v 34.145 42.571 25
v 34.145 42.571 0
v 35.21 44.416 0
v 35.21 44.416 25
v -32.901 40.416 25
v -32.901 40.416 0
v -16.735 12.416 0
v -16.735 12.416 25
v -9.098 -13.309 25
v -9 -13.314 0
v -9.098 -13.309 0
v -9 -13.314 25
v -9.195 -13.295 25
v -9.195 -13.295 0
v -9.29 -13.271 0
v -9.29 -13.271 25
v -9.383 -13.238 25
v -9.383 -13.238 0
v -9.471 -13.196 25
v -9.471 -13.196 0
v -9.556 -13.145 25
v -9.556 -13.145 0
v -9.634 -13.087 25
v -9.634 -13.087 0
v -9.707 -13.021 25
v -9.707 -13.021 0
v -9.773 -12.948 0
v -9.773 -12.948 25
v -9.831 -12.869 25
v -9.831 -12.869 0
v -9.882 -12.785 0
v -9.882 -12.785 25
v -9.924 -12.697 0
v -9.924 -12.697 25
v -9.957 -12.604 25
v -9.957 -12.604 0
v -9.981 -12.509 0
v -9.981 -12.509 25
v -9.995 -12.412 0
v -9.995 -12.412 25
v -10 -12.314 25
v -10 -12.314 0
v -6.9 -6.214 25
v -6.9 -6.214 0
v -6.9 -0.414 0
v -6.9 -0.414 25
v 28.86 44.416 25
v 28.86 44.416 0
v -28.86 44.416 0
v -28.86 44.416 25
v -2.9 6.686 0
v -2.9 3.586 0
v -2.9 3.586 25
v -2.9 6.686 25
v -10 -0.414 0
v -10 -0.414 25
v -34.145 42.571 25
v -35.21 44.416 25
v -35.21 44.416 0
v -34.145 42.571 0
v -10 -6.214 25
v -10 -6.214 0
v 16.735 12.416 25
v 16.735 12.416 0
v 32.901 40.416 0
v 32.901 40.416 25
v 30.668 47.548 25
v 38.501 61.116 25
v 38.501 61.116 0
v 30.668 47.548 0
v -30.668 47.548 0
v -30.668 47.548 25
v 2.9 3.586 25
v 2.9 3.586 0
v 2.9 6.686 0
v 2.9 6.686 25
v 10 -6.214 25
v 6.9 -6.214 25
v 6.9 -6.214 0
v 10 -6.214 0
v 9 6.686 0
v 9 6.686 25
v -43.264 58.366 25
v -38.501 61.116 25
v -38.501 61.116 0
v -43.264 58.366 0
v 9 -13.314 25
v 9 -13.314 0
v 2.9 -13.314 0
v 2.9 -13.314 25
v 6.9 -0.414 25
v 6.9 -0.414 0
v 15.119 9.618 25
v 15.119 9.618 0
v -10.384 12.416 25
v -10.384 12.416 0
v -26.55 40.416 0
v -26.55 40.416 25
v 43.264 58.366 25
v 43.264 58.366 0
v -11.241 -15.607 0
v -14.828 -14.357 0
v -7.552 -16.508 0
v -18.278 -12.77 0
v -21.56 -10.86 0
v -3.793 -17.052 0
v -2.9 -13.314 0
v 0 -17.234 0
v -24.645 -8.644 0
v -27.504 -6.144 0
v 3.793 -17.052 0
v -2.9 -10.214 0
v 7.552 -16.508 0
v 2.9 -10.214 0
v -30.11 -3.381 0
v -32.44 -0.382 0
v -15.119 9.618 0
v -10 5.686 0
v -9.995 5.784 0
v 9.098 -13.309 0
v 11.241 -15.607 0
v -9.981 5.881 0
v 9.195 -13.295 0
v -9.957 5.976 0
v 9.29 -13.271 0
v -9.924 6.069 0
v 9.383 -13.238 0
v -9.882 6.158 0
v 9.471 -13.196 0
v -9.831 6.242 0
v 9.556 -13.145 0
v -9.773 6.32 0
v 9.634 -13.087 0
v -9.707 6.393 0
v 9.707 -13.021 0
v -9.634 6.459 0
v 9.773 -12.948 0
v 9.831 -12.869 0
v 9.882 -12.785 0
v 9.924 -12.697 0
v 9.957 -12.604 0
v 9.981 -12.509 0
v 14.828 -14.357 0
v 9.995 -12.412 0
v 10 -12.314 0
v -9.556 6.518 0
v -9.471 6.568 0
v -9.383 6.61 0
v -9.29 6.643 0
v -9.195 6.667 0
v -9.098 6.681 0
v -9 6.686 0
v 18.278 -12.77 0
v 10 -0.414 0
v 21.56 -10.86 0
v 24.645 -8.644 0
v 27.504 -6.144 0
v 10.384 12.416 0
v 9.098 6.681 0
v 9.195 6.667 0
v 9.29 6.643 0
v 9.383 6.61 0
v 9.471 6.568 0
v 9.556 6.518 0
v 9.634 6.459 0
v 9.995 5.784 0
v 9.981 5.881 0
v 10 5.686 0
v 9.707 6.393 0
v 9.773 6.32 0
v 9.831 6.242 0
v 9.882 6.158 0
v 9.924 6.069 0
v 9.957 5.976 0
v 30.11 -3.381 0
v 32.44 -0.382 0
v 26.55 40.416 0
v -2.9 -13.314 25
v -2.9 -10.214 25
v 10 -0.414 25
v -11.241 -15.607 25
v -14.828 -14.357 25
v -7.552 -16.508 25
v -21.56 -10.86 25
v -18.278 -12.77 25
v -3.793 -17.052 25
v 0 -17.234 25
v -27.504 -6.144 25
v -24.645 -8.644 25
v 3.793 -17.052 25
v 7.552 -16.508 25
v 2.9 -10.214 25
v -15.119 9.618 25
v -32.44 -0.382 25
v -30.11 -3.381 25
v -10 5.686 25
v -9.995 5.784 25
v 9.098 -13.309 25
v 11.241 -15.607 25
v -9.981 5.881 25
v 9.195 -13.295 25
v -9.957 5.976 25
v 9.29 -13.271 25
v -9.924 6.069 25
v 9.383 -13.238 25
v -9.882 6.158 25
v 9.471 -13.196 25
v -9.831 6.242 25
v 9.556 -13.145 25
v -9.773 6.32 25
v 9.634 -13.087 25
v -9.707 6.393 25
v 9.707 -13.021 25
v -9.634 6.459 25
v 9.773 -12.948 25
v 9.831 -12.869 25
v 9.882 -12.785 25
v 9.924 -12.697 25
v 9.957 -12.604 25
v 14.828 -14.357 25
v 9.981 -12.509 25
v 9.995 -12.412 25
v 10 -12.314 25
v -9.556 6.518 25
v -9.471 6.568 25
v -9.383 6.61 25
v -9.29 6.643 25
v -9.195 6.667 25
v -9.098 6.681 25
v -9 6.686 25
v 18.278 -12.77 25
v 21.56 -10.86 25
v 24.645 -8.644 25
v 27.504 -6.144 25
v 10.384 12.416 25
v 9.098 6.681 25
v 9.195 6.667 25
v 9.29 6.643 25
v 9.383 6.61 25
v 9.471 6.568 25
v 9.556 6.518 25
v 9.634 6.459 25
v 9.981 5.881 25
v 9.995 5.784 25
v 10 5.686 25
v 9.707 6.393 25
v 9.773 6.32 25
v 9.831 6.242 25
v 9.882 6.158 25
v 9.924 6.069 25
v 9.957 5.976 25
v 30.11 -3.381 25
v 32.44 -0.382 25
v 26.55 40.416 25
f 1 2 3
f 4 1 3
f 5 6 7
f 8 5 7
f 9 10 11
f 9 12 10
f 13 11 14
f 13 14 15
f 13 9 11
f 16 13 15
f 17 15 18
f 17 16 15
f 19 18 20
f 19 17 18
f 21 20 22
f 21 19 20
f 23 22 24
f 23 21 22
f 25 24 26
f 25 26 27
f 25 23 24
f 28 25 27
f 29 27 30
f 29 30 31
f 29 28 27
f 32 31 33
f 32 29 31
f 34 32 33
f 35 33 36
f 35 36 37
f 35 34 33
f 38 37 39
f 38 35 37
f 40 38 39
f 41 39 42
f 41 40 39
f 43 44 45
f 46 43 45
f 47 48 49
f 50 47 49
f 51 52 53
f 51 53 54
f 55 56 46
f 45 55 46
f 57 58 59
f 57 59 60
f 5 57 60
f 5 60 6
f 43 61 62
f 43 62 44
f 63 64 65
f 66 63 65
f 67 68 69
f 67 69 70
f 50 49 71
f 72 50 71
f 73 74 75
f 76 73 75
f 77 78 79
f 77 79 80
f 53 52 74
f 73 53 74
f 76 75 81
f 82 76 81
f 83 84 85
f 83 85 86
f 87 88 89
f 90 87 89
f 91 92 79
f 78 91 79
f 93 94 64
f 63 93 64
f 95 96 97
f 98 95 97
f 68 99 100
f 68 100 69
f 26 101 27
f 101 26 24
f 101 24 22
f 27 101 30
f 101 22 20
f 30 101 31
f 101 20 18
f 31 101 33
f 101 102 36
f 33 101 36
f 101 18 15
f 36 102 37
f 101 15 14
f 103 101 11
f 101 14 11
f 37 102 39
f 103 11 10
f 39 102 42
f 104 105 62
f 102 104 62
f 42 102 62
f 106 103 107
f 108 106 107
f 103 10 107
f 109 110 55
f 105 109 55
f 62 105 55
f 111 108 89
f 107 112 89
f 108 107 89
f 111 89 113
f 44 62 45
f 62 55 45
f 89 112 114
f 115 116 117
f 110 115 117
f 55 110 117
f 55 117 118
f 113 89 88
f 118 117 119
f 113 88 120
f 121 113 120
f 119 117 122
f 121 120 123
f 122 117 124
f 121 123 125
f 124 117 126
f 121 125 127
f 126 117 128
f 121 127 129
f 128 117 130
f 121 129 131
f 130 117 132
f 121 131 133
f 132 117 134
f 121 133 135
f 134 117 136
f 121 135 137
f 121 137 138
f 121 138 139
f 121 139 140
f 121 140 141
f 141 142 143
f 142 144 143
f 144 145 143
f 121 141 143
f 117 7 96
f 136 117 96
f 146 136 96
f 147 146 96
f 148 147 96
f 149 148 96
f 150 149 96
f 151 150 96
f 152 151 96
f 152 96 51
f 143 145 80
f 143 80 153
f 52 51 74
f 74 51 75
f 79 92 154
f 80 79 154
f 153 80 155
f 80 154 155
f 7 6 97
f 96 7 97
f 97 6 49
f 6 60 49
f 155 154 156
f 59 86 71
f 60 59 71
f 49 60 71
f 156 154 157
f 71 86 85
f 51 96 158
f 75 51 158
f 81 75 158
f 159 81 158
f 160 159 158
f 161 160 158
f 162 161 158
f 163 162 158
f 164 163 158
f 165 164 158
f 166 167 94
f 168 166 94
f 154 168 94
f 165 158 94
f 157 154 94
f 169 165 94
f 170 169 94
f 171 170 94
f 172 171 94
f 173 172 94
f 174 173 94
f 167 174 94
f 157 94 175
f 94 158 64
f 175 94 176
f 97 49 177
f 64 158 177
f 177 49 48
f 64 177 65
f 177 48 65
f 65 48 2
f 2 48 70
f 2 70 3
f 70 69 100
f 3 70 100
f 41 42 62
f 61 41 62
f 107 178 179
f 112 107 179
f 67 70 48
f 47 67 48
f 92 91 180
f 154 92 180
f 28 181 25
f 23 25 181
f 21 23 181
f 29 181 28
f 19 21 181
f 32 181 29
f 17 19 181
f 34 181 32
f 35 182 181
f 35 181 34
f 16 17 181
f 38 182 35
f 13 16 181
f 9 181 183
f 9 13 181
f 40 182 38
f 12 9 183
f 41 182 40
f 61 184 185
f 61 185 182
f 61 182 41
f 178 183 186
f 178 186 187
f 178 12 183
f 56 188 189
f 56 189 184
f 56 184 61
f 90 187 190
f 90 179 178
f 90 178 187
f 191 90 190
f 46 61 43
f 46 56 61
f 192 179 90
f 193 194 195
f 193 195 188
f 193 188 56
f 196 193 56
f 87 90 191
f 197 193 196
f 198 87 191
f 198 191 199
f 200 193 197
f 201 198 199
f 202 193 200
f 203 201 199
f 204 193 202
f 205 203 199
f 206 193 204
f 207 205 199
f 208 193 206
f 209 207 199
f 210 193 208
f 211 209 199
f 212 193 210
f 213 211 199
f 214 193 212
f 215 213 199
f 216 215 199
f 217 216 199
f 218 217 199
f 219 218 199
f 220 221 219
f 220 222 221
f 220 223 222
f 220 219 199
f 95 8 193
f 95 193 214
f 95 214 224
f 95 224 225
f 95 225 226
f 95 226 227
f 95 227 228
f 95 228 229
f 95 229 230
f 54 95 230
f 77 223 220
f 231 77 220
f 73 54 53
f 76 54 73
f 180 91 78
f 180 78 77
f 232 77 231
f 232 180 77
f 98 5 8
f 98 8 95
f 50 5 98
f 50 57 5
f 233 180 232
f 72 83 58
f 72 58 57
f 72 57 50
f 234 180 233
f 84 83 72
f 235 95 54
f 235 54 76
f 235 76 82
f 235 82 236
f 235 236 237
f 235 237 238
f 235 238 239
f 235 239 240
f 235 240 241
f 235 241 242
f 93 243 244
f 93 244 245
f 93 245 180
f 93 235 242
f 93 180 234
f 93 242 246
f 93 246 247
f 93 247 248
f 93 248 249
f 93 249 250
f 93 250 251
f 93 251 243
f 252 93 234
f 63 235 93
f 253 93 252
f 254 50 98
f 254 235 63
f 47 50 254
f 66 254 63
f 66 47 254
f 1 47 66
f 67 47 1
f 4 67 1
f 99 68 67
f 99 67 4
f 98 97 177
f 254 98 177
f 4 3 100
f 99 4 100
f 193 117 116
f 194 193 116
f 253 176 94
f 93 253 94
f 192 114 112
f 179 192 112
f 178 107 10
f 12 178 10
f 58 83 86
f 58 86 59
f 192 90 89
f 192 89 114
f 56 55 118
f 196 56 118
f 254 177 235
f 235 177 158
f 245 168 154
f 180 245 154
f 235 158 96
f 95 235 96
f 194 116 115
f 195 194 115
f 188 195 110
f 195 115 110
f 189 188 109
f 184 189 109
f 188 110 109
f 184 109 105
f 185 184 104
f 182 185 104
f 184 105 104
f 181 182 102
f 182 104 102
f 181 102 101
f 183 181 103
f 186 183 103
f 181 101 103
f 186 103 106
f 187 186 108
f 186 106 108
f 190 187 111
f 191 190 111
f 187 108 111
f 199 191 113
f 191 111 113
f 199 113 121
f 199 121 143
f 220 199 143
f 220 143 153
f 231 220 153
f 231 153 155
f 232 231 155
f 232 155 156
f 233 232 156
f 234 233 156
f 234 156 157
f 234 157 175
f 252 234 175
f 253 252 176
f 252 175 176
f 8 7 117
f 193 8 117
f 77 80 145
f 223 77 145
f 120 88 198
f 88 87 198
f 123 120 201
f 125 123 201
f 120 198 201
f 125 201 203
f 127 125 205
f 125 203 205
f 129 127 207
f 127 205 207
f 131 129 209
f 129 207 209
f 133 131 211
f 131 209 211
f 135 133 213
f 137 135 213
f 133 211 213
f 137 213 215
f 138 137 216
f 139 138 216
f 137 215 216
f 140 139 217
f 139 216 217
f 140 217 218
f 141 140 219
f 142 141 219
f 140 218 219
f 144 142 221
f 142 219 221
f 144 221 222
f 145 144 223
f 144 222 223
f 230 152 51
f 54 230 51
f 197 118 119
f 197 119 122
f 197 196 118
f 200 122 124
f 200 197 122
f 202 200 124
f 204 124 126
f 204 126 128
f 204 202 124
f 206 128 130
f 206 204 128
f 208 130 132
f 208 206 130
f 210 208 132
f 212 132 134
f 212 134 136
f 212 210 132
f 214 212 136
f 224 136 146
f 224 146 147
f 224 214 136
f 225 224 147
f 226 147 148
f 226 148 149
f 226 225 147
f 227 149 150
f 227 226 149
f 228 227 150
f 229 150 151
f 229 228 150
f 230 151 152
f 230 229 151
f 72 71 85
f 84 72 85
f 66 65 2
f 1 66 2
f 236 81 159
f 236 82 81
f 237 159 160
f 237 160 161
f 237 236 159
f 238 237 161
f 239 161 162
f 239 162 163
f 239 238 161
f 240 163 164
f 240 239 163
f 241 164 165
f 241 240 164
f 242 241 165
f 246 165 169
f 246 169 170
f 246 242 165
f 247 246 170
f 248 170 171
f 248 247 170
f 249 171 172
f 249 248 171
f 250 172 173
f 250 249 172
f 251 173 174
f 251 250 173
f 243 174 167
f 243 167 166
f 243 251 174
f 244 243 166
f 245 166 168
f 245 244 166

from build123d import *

# Parameters (mm, degrees)
F0_W     = 3.1
F0_H     = 2.9
F0_W_2   = 2.9
F0_H_2   = 3.1
F1_DEPTH = 25
F2_R     = 1


with BuildPart() as f1:
    # F0 (on Top) → F1 (new body)
    with BuildSketch(Plane.XY):
        with BuildLine():
            Line((-10, -0.3823358958), (-32.44, -0.3823358958))
            ThreePointArc((-32.44, -0.3823358958), (0, -17.2338951597), (32.44, -0.3823358958))
            Line((32.44, -0.3823358958), (10, -0.3823358958))
            Line((10, -0.3823358958), (10, -0.4138951597))
            Line((10, -0.4138951597), (10, -3.3138951597))
            Line((10, -3.3138951597), (10, -6.2138951597))
            Line((10, -6.2138951597), (10, -13.3138951597))
            Line((10, -13.3138951597), (2.9, -13.3138951597))
            Line((2.9, -13.3138951597), (0, -13.3138951597))
            Line((0, -13.3138951597), (-2.9, -13.3138951597))
            Line((-2.9, -13.3138951597), (-10, -13.3138951597))
            Line((-10, -13.3138951597), (-10, -6.2138951597))
            Line((-10, -6.2138951597), (-10, -3.3138951597))
            Line((-10, -3.3138951597), (-10, -0.4138951597))
            Line((-10, -0.4138951597), (-10, -0.3823358958))
        make_face()
        with BuildLine():
            Line((28.8595280896, 44.4161048403), (32.9867018661, 44.4161048403))
            ThreePointArc((32.9867018661, 44.4161048403), (31.8657182591, 46.010563932), (30.6677337786, 47.5480089641))
            Line((30.6677337786, 47.5480089641), (28.8595280896, 44.4161048403))
        make_face()
        with BuildLine():
            Line((32.9867018661, 44.4161048403), (35.2103810507, 44.4161048403))
            Line((35.2103810507, 44.4161048403), (43.2644919243, 58.3662340832))
            Line((43.2644919243, 58.3662340832), (38.5013522035, 61.1162340832))
            Line((38.5013522035, 61.1162340832), (30.6677337786, 47.5480089641))
            ThreePointArc((30.6677337786, 47.5480089641), (31.8657182591, 46.010563932), (32.9867018661, 44.4161048403))
        make_face()
        with BuildLine():
            Line((-35.2103810507, 44.4161048403), (-32.9867018661, 44.4161048403))
            ThreePointArc((-32.9867018661, 44.4161048403), (-31.8657182591, 46.010563932), (-30.6677337786, 47.5480089641))
            Line((-30.6677337786, 47.5480089641), (-38.5013522035, 61.1162340832))
            Line((-38.5013522035, 61.1162340832), (-43.2644919243, 58.3662340832))
            Line((-43.2644919243, 58.3662340832), (-35.2103810507, 44.4161048403))
        make_face()
        with BuildLine():
            ThreePointArc((-30.6677337786, 47.5480089641), (-31.8657182591, 46.010563932), (-32.9867018661, 44.4161048403))
            Line((-32.9867018661, 44.4161048403), (-28.8595280896, 44.4161048403))
            Line((-28.8595280896, 44.4161048403), (-30.6677337786, 47.5480089641))
        make_face()
        Polygon((-15.1194919243, 9.6176641042), (-32.44, -0.3823358958), (-10, -0.3823358958), (-10, 6.6861048403), (-2.9, 6.6861048403), (0, 6.6861048403), (2.9, 6.6861048403), (10, 6.6861048403), (10, -0.3823358958), (32.44, -0.3823358958), (15.1194919243, 9.6176641042), (10.3563522035, 12.3676641042), (10.3843194756, 12.4161048403), (-10.3843194756, 12.4161048403), (-10.3563522035, 12.3676641042), align=None)
        Polygon((10.3563522035, 12.3676641042), (15.1194919243, 9.6176641042), (16.7351724366, 12.4161048403), (10.3843194756, 12.4161048403), align=None)
        Polygon((-16.7351724366, 12.4161048403), (-15.1194919243, 9.6176641042), (-10.3563522035, 12.3676641042), (-10.3843194756, 12.4161048403), align=None)
        with Locations((-8.45, -4.7638951597)):
            Rectangle(F0_W, F0_H)
        with Locations((-8.45, -1.8638951597)):
            Rectangle(F0_W, F0_H)
        with Locations((-1.45, 5.1361048403)):
            Rectangle(F0_W_2, F0_H_2)
        with Locations((1.45, 5.1361048403)):
            Rectangle(F0_W_2, F0_H_2)
        with Locations((8.45, -4.7638951597)):
            Rectangle(F0_W, F0_H)
        with Locations((8.45, -1.8638951597)):
            Rectangle(F0_W, F0_H)
        with Locations((1.45, -11.7638951597)):
            Rectangle(F0_W_2, F0_H_2)
        with Locations((-1.45, -11.7638951597)):
            Rectangle(F0_W_2, F0_H_2)
        Polygon((-32.900979974, 40.4161048403), (-16.7351724366, 12.4161048403), (-10.3843194756, 12.4161048403), (-26.5501270129, 40.4161048403), align=None)
        Polygon((-28.8595280896, 44.4161048403), (-26.5501270129, 40.4161048403), (26.5501270129, 40.4161048403), (28.8595280896, 44.4161048403), align=None)
        with BuildLine():
            Line((26.5501270129, 40.4161048403), (32.900979974, 40.4161048403))
            Line((32.900979974, 40.4161048403), (34.1452121911, 42.5711782568))
            ThreePointArc((34.1452121911, 42.5711782568), (33.5786302545, 43.501599623), (32.9867018661, 44.4161048403))
            Line((32.9867018661, 44.4161048403), (28.8595280896, 44.4161048403))
            Line((28.8595280896, 44.4161048403), (26.5501270129, 40.4161048403))
        make_face()
        Polygon((10.3843194756, 12.4161048403), (16.7351724366, 12.4161048403), (32.900979974, 40.4161048403), (26.5501270129, 40.4161048403), align=None)
        with BuildLine():
            Line((-34.1452121911, 42.5711782568), (-32.900979974, 40.4161048403))
            Line((-32.900979974, 40.4161048403), (-26.5501270129, 40.4161048403))
            Line((-26.5501270129, 40.4161048403), (-28.8595280896, 44.4161048403))
            Line((-28.8595280896, 44.4161048403), (-32.9867018661, 44.4161048403))
            ThreePointArc((-32.9867018661, 44.4161048403), (-33.5786302545, 43.501599623), (-34.1452121911, 42.5711782568))
        make_face()
        with BuildLine():
            Line((-35.2103810507, 44.4161048403), (-34.1452121911, 42.5711782568))
            ThreePointArc((-34.1452121911, 42.5711782568), (-33.5786302545, 43.501599623), (-32.9867018661, 44.4161048403))
            Line((-32.9867018661, 44.4161048403), (-35.2103810507, 44.4161048403))
        make_face()
        with BuildLine():
            ThreePointArc((32.9867018661, 44.4161048403), (33.5786302545, 43.501599623), (34.1452121911, 42.5711782568))
            Line((34.1452121911, 42.5711782568), (35.2103810507, 44.4161048403))
            Line((35.2103810507, 44.4161048403), (32.9867018661, 44.4161048403))
        make_face()
    extrude(amount=F1_DEPTH)

    # F2
    f2_edges = [f1.edges().sort_by_distance(p)[0] for p in [
        (-10, -13.313895, 12.5),
        (-10, 6.686105, 12.5),
        (10, -13.313895, 12.5),
        (10, 6.686105, 12.5),
    ]]
    fillet(f2_edges, radius=F2_R)


solid = f1.part
